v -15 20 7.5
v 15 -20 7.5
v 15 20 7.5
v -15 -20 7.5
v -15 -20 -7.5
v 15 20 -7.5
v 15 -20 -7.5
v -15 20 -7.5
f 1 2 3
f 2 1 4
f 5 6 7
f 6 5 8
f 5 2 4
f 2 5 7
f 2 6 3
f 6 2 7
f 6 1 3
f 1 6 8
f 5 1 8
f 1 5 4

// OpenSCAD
width = 30; // [10, 100]
height = 40; // [10, 100]
depth = 15;  // [5, 50]

cube([width, height, depth], center=true);
